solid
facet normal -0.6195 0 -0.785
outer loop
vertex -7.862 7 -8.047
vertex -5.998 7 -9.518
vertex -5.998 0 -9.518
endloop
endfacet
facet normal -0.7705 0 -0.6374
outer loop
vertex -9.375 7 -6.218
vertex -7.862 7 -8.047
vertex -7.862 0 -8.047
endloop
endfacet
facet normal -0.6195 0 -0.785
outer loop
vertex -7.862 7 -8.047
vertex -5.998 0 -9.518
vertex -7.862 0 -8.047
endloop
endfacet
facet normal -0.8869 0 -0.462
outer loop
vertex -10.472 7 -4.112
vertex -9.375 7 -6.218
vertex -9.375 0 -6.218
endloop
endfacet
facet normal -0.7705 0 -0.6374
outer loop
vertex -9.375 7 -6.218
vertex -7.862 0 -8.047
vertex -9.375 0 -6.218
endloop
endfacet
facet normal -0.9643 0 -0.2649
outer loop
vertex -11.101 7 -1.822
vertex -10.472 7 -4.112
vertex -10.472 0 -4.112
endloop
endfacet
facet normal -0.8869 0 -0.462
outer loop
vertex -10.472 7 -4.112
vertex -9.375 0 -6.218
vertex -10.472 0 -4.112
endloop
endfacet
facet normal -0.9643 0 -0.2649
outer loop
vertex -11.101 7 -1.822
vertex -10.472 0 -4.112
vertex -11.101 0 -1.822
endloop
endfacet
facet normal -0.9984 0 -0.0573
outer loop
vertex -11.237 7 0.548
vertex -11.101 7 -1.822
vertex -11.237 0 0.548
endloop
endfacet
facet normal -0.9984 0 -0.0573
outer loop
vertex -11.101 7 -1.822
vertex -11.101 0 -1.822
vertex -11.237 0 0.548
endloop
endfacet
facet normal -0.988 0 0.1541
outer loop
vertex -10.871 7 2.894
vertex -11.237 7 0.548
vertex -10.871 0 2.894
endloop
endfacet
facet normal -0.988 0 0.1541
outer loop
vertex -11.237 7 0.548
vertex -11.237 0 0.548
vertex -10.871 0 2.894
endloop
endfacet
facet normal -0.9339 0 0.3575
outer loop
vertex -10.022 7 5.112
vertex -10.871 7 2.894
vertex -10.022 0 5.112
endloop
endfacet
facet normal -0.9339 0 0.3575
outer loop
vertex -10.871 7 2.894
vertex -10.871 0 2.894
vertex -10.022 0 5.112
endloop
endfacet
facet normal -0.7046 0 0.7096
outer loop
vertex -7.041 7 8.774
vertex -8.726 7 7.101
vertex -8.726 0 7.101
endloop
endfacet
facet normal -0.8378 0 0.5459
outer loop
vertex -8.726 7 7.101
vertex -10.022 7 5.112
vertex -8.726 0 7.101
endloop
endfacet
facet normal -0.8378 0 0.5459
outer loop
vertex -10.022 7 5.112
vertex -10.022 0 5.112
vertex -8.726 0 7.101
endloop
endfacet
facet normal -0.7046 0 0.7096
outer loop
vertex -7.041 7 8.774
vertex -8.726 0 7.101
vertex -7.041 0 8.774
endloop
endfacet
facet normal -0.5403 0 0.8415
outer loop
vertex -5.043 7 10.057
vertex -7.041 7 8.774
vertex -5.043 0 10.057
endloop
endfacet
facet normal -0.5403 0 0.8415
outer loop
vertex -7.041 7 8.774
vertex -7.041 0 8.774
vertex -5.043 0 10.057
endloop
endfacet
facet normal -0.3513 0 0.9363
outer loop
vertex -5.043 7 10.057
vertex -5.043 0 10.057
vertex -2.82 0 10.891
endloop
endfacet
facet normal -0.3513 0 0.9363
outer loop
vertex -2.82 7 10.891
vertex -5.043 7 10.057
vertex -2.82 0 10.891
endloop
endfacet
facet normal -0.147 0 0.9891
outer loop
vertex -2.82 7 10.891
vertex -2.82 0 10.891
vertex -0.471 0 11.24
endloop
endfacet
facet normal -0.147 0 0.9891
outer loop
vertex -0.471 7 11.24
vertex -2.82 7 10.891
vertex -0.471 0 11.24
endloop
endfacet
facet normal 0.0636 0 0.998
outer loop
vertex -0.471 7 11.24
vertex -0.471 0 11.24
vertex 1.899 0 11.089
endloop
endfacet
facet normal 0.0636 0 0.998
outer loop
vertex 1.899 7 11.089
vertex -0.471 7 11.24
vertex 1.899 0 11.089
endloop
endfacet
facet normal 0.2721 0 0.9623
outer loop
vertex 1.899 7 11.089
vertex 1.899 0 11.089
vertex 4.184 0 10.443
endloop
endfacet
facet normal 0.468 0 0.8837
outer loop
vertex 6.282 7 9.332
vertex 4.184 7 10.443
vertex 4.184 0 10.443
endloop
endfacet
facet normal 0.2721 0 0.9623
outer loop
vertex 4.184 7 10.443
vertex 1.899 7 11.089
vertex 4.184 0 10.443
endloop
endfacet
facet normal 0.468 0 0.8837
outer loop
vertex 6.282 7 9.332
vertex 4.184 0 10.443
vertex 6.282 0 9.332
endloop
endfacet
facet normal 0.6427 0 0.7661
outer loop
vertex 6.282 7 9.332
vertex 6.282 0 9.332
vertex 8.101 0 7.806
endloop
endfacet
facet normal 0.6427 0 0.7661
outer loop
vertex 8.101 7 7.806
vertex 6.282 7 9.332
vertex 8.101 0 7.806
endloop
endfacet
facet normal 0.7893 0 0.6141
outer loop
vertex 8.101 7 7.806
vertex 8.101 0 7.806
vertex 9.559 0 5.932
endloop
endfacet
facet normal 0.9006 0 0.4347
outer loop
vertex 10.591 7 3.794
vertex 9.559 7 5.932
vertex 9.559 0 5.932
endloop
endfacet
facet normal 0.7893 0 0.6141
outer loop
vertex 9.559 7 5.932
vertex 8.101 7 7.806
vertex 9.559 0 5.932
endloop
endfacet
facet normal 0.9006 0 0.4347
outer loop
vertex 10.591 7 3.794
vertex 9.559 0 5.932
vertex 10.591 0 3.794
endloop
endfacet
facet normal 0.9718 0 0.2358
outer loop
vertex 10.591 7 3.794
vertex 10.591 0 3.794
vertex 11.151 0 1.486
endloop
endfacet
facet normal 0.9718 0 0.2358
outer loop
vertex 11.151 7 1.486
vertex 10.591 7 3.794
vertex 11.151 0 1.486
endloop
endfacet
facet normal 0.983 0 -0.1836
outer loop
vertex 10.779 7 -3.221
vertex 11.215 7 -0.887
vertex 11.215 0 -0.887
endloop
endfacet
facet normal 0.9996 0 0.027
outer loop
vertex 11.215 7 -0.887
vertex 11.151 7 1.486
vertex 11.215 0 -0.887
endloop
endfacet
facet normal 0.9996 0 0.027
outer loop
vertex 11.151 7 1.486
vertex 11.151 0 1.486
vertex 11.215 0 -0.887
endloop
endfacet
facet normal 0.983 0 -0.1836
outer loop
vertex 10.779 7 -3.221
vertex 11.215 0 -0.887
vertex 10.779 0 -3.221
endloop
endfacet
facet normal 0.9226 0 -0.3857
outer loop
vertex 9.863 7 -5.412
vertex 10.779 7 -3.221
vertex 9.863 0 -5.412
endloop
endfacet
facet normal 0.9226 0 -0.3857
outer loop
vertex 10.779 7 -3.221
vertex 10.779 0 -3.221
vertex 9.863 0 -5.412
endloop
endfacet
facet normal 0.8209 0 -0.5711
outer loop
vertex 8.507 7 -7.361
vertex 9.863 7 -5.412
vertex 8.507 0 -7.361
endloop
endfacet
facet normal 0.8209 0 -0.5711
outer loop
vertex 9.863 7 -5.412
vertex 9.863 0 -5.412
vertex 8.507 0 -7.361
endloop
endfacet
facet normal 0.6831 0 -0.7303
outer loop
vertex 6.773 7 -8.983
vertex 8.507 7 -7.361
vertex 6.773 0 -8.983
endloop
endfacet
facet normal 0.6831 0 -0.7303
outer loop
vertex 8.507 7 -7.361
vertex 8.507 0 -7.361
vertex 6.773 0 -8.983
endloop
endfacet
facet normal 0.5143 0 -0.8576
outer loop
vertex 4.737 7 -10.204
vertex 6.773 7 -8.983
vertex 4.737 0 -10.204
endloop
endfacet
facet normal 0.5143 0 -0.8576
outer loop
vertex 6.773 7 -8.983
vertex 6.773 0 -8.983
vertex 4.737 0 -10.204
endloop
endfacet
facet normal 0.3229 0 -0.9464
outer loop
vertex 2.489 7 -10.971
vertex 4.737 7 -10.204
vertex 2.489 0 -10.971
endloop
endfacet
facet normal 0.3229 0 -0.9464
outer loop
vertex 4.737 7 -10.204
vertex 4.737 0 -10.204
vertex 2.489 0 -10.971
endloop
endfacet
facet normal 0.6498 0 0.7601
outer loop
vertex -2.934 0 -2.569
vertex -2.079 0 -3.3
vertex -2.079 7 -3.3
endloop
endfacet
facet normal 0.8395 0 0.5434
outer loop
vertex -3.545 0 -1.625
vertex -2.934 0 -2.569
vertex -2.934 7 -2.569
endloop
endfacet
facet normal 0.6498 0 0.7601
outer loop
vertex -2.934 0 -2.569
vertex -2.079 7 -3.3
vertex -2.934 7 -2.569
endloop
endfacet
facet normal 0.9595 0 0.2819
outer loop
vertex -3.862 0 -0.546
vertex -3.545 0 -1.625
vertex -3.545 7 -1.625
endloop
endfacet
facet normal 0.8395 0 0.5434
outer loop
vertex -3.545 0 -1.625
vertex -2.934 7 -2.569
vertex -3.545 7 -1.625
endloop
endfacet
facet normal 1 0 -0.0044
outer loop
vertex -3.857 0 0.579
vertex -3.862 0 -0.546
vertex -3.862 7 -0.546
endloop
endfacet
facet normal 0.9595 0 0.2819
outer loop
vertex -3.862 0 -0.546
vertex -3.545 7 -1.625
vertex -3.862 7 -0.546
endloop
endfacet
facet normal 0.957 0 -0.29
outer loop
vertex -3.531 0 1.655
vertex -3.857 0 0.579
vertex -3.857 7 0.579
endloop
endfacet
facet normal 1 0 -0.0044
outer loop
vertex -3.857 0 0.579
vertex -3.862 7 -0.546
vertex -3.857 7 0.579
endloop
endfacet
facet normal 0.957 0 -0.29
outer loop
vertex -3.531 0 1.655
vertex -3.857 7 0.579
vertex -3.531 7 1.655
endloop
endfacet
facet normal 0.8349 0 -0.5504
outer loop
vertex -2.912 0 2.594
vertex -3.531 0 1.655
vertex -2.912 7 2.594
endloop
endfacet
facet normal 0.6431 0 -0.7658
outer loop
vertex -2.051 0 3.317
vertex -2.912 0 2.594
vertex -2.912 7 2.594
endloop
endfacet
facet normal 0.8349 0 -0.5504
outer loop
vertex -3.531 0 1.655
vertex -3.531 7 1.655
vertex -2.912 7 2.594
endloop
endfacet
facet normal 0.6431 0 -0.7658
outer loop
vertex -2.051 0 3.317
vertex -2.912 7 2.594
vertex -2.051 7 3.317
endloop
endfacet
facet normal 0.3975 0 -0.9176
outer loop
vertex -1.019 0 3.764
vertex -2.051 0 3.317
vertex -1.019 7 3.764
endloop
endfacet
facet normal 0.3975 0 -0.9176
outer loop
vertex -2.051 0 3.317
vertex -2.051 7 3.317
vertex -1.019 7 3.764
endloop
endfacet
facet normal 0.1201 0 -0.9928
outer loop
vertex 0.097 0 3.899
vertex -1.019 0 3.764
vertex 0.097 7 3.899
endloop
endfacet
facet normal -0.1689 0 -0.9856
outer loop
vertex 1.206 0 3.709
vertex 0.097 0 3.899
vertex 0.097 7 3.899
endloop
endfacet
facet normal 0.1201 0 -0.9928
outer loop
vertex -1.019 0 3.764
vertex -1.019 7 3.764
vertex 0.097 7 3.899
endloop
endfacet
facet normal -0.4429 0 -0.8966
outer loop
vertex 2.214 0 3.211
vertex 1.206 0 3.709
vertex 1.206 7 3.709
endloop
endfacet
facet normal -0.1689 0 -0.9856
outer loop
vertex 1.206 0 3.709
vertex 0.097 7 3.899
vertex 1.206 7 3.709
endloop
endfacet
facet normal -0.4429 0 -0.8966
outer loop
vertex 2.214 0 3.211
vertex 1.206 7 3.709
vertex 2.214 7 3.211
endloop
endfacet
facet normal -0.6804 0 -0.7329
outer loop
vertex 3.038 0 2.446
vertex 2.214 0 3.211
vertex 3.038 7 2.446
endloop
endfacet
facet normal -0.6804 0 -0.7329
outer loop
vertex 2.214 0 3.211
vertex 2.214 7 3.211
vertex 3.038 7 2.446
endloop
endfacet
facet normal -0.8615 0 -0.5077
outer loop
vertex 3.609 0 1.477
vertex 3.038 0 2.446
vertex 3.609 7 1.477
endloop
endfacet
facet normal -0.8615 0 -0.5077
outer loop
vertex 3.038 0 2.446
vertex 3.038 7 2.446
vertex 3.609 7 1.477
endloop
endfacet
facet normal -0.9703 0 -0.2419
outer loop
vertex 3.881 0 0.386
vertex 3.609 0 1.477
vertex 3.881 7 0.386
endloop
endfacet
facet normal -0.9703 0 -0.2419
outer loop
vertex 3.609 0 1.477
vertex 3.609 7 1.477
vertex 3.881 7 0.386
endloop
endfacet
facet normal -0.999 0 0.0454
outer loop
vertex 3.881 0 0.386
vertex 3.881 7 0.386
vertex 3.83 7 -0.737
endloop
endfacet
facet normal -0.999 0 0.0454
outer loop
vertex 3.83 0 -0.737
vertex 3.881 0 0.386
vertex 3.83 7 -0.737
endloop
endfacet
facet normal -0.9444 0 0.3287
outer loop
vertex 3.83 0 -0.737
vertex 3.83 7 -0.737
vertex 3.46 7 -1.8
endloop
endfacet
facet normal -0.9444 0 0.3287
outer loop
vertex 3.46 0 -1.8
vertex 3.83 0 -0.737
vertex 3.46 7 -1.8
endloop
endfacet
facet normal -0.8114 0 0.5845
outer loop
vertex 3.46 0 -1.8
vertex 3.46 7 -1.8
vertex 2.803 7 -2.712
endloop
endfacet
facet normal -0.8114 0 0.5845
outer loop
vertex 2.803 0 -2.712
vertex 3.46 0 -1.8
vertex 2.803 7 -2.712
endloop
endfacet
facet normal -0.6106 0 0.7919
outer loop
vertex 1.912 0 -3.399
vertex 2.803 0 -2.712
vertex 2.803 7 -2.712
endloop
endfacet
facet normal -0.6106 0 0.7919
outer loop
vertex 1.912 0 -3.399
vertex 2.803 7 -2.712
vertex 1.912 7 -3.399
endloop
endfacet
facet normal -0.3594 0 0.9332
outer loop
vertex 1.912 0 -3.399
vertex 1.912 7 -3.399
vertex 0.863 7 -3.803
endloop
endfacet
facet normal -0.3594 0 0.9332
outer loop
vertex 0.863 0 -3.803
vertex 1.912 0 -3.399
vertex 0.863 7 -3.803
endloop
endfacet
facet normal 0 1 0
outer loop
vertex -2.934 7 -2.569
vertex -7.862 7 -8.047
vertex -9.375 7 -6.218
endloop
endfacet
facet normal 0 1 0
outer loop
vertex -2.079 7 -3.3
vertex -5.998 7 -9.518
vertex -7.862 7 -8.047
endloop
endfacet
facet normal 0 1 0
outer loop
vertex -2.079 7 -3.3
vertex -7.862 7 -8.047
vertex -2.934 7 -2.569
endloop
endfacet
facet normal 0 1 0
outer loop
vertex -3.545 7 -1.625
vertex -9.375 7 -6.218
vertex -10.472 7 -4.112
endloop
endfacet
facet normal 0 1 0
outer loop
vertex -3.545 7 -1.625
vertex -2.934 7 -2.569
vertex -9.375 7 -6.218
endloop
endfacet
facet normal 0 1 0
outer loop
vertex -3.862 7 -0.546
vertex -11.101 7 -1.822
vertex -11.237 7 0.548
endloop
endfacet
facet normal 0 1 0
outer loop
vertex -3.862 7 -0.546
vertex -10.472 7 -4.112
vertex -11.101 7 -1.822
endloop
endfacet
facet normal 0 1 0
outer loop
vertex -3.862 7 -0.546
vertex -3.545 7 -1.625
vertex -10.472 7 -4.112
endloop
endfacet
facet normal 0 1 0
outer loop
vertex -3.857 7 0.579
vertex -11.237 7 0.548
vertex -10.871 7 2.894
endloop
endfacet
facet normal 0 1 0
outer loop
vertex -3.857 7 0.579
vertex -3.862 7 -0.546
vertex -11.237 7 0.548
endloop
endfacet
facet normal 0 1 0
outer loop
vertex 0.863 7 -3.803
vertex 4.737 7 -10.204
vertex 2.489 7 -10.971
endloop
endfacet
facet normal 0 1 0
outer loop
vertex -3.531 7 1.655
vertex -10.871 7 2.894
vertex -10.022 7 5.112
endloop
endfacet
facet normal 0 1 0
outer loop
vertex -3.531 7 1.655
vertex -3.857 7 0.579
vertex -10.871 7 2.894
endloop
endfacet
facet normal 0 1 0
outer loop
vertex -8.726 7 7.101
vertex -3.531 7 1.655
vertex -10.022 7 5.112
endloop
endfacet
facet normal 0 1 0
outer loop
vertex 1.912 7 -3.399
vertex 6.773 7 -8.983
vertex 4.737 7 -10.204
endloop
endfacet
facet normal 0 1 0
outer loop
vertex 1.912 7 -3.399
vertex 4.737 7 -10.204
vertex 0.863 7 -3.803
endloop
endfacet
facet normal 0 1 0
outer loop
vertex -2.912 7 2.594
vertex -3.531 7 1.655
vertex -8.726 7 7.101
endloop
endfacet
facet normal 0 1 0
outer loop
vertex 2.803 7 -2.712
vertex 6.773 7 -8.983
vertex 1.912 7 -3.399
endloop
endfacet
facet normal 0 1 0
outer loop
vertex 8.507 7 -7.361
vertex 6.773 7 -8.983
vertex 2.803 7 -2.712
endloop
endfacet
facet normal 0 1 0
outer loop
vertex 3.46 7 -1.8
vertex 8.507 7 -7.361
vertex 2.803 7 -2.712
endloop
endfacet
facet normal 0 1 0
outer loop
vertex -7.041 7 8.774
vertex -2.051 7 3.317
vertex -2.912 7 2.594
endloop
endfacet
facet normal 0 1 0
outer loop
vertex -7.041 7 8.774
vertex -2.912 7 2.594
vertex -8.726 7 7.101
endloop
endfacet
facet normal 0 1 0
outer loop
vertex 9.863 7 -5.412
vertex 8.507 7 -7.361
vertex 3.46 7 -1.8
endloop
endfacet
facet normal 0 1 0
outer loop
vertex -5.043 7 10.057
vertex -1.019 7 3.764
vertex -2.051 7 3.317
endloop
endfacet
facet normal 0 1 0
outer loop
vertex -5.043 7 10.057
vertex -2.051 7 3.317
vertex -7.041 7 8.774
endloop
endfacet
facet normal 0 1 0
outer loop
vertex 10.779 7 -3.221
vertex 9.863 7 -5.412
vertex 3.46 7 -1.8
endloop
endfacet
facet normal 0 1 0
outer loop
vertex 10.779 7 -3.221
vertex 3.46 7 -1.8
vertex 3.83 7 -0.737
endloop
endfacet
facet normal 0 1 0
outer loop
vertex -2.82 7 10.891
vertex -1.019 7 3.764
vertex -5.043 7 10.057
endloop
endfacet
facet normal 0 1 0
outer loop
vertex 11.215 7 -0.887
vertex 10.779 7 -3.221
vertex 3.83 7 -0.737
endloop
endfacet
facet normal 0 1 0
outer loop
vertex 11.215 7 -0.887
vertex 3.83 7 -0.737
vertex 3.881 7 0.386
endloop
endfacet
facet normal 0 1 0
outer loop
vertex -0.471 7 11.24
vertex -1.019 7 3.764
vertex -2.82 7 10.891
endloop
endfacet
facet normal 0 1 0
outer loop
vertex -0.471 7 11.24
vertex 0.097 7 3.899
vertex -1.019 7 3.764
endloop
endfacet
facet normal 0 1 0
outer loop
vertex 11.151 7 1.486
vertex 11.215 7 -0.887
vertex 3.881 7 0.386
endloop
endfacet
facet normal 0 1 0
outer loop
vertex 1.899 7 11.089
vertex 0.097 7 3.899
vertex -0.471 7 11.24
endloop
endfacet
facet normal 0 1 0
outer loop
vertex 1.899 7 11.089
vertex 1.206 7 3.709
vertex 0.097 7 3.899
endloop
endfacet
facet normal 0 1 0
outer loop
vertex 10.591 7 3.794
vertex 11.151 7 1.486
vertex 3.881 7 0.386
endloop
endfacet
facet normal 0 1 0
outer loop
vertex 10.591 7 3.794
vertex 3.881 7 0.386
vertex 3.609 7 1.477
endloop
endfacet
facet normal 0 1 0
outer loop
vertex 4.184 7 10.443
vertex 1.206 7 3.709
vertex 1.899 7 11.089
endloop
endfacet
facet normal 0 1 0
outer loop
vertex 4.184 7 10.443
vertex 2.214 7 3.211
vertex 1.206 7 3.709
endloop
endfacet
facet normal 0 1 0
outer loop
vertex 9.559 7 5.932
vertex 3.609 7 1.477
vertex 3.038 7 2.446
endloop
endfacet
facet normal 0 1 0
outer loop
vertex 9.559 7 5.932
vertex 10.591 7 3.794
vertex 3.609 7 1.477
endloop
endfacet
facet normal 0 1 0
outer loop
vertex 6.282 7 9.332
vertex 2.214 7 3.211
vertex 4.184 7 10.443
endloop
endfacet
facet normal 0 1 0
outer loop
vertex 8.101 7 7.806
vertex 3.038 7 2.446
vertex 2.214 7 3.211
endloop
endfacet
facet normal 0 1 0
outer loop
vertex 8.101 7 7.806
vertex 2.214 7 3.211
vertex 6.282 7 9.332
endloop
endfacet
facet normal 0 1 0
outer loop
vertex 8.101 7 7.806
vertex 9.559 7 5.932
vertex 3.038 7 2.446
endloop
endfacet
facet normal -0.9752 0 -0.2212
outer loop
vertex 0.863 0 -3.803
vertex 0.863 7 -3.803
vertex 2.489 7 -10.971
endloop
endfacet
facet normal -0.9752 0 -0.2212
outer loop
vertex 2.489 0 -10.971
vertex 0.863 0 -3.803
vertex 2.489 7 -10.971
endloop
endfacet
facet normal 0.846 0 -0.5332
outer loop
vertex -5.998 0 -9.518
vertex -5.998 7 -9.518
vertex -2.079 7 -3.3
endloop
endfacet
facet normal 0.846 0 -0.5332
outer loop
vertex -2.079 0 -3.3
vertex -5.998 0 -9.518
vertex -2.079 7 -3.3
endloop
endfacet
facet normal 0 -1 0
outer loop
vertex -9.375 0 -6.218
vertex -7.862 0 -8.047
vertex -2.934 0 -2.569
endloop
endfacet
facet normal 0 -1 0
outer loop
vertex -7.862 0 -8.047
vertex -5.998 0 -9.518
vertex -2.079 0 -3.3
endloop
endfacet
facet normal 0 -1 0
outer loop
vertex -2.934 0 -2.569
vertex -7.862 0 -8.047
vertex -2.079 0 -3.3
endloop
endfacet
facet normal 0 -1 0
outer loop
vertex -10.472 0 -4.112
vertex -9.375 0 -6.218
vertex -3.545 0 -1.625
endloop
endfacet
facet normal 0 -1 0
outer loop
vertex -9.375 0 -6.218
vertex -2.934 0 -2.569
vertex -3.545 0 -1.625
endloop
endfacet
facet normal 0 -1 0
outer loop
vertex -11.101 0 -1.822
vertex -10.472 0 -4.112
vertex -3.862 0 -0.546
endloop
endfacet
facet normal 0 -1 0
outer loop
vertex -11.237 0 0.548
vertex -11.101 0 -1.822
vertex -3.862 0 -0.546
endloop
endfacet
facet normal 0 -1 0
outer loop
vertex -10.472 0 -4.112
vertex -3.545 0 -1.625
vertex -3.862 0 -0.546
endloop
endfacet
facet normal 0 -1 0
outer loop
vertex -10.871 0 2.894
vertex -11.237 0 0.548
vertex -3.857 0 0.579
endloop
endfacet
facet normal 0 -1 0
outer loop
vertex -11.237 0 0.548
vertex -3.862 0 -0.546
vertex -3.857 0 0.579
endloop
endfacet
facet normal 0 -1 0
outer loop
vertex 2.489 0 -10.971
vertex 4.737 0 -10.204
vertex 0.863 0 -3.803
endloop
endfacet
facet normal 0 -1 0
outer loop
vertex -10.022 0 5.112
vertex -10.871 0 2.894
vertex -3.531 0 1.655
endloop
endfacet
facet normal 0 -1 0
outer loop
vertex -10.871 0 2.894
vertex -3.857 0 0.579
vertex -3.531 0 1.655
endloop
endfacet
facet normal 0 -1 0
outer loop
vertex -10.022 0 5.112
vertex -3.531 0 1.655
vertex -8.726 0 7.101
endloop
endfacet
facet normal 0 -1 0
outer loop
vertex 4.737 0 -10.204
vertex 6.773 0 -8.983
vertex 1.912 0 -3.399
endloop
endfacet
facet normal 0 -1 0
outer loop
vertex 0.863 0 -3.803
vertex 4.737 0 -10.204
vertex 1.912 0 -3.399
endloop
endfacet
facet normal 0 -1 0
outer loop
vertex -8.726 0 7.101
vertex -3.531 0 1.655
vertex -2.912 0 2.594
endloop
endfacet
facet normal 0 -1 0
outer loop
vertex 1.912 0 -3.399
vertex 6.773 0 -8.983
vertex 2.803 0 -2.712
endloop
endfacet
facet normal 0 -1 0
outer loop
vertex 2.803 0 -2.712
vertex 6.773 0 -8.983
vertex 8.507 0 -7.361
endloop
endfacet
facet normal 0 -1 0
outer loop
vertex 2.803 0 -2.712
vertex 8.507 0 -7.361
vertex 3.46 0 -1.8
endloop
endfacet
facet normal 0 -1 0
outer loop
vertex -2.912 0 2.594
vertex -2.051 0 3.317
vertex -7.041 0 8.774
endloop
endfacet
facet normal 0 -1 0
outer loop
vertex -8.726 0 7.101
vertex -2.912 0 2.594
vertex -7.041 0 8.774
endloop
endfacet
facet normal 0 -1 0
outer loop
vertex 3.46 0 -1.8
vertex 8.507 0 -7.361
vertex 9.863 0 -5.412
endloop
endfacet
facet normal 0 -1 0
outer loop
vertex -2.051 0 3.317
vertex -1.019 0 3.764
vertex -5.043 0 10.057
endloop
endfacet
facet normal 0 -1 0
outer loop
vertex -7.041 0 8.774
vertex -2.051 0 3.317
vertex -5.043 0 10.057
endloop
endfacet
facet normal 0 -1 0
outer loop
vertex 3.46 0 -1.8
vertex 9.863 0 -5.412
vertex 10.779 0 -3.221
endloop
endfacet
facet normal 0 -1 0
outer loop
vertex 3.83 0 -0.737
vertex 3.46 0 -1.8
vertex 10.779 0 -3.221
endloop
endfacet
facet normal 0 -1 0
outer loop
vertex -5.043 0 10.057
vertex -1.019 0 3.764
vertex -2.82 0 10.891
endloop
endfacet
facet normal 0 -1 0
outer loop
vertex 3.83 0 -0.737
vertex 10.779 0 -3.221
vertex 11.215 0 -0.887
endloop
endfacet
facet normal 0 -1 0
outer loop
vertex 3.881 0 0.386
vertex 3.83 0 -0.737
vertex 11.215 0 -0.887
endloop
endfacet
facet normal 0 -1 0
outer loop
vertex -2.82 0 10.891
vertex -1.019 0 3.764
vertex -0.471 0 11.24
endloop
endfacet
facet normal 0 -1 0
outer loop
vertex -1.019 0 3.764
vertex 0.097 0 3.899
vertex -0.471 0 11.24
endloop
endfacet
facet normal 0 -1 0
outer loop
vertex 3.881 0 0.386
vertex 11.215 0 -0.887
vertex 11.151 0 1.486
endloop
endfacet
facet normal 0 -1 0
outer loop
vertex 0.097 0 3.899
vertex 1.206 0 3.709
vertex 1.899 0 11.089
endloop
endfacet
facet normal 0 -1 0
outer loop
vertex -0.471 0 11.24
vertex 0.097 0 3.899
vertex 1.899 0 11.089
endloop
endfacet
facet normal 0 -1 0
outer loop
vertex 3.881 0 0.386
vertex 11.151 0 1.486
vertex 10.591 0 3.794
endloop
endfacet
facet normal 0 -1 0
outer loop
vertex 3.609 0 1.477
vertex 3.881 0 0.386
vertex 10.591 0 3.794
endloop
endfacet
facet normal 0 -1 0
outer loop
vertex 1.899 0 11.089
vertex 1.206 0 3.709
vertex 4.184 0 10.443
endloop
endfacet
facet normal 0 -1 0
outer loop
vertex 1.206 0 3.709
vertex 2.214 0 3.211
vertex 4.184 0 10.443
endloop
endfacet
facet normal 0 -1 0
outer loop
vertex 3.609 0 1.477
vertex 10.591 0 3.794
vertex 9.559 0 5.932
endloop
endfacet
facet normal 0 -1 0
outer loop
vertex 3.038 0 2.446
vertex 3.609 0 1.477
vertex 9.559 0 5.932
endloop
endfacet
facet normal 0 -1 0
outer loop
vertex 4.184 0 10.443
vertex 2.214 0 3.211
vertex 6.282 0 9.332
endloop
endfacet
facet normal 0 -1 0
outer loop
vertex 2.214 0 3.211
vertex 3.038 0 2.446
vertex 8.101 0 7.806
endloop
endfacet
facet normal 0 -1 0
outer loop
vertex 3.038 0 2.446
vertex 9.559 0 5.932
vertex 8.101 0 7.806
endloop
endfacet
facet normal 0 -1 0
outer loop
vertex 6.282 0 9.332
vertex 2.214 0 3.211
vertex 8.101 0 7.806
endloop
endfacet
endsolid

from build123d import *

# Parameters (mm, degrees)
SKETCH1_R           = 11.25
BOSS_EXTRUDE1_DEPTH = 7
SKETCH2_R           = 3.9
CUT_EXTRUDE1_DEPTH  = 7
CUT_EXTRUDE2_DEPTH  = 7


with BuildPart() as part:
    # Sketch1 → Boss-Extrude1 (new body)
    with BuildSketch(Plane(origin=(0, 0, 0), x_dir=(1, 0, 0), z_dir=(0, 1, 0))):
        Circle(SKETCH1_R)
    extrude(amount=BOSS_EXTRUDE1_DEPTH)

    # Sketch2 → Cut-Extrude1 (cut)
    with BuildSketch(Plane(origin=(0, 7, 0), x_dir=(1, 0, 0), z_dir=(0, 1, 0))):
        Circle(SKETCH2_R)
    extrude(amount=-CUT_EXTRUDE1_DEPTH, mode=Mode.SUBTRACT)

    # Sketch3 → Cut-Extrude2 (cut)
    with BuildSketch(Plane(origin=(0, 7, 0), x_dir=(1, 0, 0), z_dir=(0, 1, 0))):
        with BuildLine():
            ThreePointArc((-2.079150674, 3.299565498), (-0.658195703, 3.844057546), (0.862963598, 3.803326679))
            Line((0.862963598, 3.803326679), (2.48931807, 10.971134652))
            ThreePointArc((2.48931807, 10.971134652), (-1.898641451, 11.088627536), (-5.997550022, 9.517977397))
            Line((-5.997550022, 9.517977397), (-2.079150674, 3.299565498))
        make_face()
    extrude(amount=-CUT_EXTRUDE2_DEPTH, mode=Mode.SUBTRACT)


solid = part.part
